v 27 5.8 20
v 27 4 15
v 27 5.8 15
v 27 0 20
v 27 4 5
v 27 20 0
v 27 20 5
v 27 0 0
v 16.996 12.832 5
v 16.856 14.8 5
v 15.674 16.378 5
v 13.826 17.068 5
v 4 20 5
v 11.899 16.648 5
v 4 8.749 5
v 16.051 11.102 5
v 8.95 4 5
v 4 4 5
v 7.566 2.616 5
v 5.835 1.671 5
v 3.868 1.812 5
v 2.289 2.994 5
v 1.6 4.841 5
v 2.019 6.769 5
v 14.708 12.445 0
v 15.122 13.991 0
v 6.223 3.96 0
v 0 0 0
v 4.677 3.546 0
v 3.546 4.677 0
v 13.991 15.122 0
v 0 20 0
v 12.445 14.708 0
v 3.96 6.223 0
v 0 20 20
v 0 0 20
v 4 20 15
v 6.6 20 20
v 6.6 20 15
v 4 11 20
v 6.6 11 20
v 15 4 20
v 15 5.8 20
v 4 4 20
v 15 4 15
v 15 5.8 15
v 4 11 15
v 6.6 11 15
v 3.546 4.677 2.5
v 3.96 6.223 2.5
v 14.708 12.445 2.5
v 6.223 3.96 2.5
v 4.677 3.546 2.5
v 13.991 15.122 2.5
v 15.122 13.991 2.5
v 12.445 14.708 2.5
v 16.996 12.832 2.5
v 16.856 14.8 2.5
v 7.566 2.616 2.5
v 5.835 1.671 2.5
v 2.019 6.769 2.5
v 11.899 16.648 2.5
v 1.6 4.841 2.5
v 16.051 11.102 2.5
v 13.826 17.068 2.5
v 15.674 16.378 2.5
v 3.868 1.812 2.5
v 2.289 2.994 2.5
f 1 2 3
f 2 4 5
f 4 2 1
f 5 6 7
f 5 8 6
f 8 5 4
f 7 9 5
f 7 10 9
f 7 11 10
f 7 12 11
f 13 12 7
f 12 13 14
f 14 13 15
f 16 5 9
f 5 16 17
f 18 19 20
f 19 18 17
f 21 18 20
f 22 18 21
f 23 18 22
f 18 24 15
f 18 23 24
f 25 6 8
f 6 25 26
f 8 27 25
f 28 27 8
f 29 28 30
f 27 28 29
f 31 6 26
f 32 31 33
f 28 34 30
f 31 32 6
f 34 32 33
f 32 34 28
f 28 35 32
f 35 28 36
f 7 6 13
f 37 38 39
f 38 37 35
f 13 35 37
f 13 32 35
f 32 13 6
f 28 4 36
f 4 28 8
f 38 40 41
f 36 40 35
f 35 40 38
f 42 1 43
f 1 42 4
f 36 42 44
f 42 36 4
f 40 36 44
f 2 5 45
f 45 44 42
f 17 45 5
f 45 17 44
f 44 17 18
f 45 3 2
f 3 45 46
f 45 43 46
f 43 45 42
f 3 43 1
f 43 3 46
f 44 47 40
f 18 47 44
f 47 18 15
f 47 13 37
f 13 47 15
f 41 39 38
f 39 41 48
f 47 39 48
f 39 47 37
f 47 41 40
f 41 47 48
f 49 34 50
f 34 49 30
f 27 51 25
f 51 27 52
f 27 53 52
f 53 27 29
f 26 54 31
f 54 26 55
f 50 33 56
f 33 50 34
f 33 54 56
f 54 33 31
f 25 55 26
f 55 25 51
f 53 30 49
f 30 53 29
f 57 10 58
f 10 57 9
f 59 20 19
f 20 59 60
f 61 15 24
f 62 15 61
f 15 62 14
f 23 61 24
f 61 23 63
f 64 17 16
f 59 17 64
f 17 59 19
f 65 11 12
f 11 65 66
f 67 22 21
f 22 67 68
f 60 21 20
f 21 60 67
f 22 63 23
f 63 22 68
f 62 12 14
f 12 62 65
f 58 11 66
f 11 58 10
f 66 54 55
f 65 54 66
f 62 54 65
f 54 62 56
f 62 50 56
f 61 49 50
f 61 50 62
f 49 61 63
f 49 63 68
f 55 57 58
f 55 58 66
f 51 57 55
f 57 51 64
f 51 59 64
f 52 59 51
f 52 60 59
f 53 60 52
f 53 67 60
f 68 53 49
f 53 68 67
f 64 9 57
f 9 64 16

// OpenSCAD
// OpenSCAD model by tselling
// based on OpenSCAD thing:726983 by markwal
// dimensions in mm

// Allows you to modify almost everything on the clip
// In general the Back Right corner and the Front Left 
// corner use the same clip so just duplicate it unless 
// you need something different.  I wanted my side 
// walls to be shorter than the back/front walls to avoid 
// hitting my custom filament spool holder on the inside 
// of my Dreamer.  You can just make the back & right lengths
// the same for a square piece if you don't need a shorter
// side.

// Just change this variable for opposite corners (1 vs 0)
doOppositeCorners=0;

// (mm) thickness of the base of the clip 
//   (too thick may require longer screw)
baseThickness=5;

// (mm) adjust thickness of the wall of the clip
wallThickness=4;

// (mm) thickness of build plate without glass (round up)
// This will be the wall height.
plateThickness=10;

// (mm) thickness of the glass plate (round down)
// This will be the tab height.
glassThickness=5;

// (mm) how long at the back (X-Axis)
baseBack=27;

// (mm) how long on the side (Y-Axis)
baseRight=20;

// (mm) length of back wall (shorten if you want open corner)
wallBack=27;

// (mm) length of right wall (shorten if you want open corner)
wallRight=20;

// Back tab length
tabBackLength=12;

// Right tab length
tabRightLength=9;

// (mm) space in back/front of glass plate (when centered)
tabBackThickness=1.8;

// (mm) space on the left/right side of glass plate (when centered)
tabRightThickness=2.6;

// (mm) slotLength for bolt
slotLength=12;

// (mm) width of the bolt slot
boltDiameter=3.2;

// (mm) allows you to leave  original nut attached to build
// plate and add wingnut to the bottom.
nutDiameter=7;
nutHeight=2.5;

difference() {
union() {
    
total_height = baseThickness+plateThickness+glassThickness; 

baseX = doOppositeCorners ? baseRight : baseBack;
baseY = doOppositeCorners ? baseBack : baseRight;
wallX = doOppositeCorners ? wallRight : wallBack;
wallY = doOppositeCorners ? wallBack : wallRight;
tabX = doOppositeCorners ? tabRightLength : tabBackLength;
tabY = doOppositeCorners ? tabBackLength : tabRightLength;
tabX_thickness = doOppositeCorners ? tabRightThickness : tabBackThickness;
tabY_thickness = doOppositeCorners ? tabBackThickness : tabRightThickness;
    
// base
cube([baseX,baseY,baseThickness]);
 
// Wall on X Axis
translate([baseX-wallX,0,0]) 
    cube([wallX,wallThickness, total_height]);

// Tab on X Axis
translate([baseX-tabX,0,baseThickness+plateThickness])
	cube([tabX,wallThickness+tabX_thickness,glassThickness]);
    
// Wall on Y Axis
translate([0,baseY-wallY,0])
	cube([wallThickness,wallY,total_height]);
    
// Tab on Y Axis
translate([0,baseY-tabY,baseThickness+plateThickness])
	cube([wallThickness+tabY_thickness,tabY,glassThickness]);
}

    //remove the slots 
    rotate([0,0,-45]) {
        translate([0,wallThickness+boltDiameter,0]){
    
            // bolt slot
            hull() {
                cylinder(h=baseThickness,d=boltDiameter);
                translate([0, slotLength,0])
                    cylinder(h=baseThickness,d=boltDiameter);
            }
            
            // nut slot       
            translate([0,0, baseThickness-nutHeight]) hull() {
                cylinder(h=nutHeight,d=nutDiameter);
                translate([0, slotLength, 0]) 
                    cylinder(h=nutHeight,d=nutDiameter); 
            }
        }
    }
}
